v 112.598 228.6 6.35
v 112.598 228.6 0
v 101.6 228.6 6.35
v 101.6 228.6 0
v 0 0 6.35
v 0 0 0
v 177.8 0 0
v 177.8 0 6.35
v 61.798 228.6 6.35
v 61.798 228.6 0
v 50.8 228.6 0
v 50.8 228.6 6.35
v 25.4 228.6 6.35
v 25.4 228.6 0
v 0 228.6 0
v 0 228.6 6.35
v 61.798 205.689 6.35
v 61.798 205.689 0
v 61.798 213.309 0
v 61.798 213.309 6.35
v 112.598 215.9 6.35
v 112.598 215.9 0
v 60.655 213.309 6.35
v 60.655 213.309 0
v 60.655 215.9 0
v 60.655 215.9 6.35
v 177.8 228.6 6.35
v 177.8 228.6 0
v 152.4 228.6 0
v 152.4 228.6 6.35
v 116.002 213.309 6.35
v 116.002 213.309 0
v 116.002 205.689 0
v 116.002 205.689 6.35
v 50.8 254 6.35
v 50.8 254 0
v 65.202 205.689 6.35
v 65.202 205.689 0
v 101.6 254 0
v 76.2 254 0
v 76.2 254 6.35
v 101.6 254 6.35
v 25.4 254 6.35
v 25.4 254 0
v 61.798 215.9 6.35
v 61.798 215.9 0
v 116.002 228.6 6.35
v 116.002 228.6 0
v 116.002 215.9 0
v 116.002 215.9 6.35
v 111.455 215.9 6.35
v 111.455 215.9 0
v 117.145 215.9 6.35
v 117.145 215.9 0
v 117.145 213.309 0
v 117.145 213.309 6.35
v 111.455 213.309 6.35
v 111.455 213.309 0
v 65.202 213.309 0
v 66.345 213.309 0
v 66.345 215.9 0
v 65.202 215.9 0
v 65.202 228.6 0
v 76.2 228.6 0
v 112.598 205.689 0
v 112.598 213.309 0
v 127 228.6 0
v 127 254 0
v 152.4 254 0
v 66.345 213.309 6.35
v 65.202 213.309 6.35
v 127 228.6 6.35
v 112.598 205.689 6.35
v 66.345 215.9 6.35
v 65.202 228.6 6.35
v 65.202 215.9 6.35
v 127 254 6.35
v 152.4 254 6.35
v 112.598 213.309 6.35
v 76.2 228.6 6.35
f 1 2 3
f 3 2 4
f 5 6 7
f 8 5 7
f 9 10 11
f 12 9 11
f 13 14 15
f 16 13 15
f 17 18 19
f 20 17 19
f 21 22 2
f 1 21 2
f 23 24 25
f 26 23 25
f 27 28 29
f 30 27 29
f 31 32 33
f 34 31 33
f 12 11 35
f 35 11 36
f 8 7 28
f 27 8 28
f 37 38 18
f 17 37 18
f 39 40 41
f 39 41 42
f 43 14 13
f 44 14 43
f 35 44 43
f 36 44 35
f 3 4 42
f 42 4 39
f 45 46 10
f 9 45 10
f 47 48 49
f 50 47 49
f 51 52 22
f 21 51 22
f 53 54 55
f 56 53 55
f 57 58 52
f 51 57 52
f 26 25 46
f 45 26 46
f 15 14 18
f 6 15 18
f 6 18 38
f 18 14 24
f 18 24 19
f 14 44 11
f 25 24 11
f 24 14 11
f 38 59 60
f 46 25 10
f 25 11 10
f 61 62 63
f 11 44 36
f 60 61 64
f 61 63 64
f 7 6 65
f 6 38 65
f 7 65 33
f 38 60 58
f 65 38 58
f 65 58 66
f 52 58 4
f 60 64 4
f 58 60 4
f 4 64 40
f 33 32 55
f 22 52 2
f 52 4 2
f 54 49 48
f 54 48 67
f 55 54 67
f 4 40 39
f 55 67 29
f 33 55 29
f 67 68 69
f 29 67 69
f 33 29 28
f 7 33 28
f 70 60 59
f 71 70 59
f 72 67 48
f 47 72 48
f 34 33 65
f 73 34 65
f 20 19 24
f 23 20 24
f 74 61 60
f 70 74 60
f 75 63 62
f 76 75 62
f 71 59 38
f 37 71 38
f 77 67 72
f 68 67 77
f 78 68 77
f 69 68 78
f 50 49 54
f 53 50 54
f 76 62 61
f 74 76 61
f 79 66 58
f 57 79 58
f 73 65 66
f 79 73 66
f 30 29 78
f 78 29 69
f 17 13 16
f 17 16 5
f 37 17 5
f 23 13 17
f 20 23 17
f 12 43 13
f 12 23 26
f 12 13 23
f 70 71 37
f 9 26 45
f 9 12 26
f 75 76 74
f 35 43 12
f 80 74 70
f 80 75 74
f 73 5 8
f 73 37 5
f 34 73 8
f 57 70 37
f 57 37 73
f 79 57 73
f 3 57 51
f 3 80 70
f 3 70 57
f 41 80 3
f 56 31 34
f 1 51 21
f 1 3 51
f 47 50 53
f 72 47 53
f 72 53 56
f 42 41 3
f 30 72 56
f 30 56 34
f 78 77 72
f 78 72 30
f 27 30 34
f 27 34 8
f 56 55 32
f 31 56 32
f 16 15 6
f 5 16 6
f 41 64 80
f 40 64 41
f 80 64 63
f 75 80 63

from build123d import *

# Parameters (mm, degrees)
SKETCH1_W           = 25.4
SKETCH1_H           = 25.4
BOSS_EXTRUDE1_DEPTH = 6.35


with BuildPart() as part:
    # Sketch1 → Boss-Extrude1 (new body)
    with BuildSketch(Plane.XY):
        with Locations((38.1, 241.3)):
            Rectangle(SKETCH1_W, SKETCH1_H)
        with Locations((88.9, 241.3)):
            Rectangle(SKETCH1_W, SKETCH1_H)
        with Locations((139.7, 241.3)):
            Rectangle(SKETCH1_W, SKETCH1_H)
        Polygon((0, 228.6), (0, 0), (177.8, 0), (177.8, 228.6), (152.4, 228.6), (127, 228.6), (116.0018, 228.6), (116.0018, 215.9), (117.1448, 215.9), (117.1448, 213.3092), (116.0018, 213.3092), (116.0018, 205.6892), (112.5982, 205.6892), (112.5982, 213.3092), (111.4552, 213.3092), (111.4552, 215.9), (112.5982, 215.9), (112.5982, 228.6), (101.6, 228.6), (76.2, 228.6), (65.2018, 228.6), (65.2018, 215.9), (66.3448, 215.9), (66.3448, 213.3092), (65.2018, 213.3092), (65.2018, 205.6892), (61.7982, 205.6892), (61.7982, 213.3092), (60.6552, 213.3092), (60.6552, 215.9), (61.7982, 215.9), (61.7982, 228.6), (50.8, 228.6), (25.4, 228.6), align=None)
    extrude(amount=BOSS_EXTRUDE1_DEPTH)


solid = part.part
